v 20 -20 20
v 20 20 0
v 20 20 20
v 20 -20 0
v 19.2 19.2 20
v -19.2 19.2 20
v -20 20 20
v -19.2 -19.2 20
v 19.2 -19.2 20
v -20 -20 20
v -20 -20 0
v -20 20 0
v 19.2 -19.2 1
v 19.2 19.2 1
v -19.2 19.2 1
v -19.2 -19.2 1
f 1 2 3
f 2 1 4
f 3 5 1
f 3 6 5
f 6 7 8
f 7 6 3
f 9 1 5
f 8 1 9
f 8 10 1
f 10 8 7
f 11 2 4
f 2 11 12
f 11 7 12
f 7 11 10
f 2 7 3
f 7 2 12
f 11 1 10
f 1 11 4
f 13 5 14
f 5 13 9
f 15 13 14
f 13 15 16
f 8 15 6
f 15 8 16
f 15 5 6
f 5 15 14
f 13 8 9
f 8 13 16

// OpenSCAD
// Infeasible spec, adapted: the requested 0.3 mm walls are thickened inward to
// 0.8 mm (two perimeters) so the outer envelope is unchanged.
$fn = 96;
outer = 40; height = 20; wall = 0.8; floor_thickness = 1.0;
difference() {
    translate([-outer / 2, -outer / 2, 0]) cube([outer, outer, height]);
    translate([-outer / 2 + wall, -outer / 2 + wall, floor_thickness]) cube([outer - 2 * wall, outer - 2 * wall, height]);
}
